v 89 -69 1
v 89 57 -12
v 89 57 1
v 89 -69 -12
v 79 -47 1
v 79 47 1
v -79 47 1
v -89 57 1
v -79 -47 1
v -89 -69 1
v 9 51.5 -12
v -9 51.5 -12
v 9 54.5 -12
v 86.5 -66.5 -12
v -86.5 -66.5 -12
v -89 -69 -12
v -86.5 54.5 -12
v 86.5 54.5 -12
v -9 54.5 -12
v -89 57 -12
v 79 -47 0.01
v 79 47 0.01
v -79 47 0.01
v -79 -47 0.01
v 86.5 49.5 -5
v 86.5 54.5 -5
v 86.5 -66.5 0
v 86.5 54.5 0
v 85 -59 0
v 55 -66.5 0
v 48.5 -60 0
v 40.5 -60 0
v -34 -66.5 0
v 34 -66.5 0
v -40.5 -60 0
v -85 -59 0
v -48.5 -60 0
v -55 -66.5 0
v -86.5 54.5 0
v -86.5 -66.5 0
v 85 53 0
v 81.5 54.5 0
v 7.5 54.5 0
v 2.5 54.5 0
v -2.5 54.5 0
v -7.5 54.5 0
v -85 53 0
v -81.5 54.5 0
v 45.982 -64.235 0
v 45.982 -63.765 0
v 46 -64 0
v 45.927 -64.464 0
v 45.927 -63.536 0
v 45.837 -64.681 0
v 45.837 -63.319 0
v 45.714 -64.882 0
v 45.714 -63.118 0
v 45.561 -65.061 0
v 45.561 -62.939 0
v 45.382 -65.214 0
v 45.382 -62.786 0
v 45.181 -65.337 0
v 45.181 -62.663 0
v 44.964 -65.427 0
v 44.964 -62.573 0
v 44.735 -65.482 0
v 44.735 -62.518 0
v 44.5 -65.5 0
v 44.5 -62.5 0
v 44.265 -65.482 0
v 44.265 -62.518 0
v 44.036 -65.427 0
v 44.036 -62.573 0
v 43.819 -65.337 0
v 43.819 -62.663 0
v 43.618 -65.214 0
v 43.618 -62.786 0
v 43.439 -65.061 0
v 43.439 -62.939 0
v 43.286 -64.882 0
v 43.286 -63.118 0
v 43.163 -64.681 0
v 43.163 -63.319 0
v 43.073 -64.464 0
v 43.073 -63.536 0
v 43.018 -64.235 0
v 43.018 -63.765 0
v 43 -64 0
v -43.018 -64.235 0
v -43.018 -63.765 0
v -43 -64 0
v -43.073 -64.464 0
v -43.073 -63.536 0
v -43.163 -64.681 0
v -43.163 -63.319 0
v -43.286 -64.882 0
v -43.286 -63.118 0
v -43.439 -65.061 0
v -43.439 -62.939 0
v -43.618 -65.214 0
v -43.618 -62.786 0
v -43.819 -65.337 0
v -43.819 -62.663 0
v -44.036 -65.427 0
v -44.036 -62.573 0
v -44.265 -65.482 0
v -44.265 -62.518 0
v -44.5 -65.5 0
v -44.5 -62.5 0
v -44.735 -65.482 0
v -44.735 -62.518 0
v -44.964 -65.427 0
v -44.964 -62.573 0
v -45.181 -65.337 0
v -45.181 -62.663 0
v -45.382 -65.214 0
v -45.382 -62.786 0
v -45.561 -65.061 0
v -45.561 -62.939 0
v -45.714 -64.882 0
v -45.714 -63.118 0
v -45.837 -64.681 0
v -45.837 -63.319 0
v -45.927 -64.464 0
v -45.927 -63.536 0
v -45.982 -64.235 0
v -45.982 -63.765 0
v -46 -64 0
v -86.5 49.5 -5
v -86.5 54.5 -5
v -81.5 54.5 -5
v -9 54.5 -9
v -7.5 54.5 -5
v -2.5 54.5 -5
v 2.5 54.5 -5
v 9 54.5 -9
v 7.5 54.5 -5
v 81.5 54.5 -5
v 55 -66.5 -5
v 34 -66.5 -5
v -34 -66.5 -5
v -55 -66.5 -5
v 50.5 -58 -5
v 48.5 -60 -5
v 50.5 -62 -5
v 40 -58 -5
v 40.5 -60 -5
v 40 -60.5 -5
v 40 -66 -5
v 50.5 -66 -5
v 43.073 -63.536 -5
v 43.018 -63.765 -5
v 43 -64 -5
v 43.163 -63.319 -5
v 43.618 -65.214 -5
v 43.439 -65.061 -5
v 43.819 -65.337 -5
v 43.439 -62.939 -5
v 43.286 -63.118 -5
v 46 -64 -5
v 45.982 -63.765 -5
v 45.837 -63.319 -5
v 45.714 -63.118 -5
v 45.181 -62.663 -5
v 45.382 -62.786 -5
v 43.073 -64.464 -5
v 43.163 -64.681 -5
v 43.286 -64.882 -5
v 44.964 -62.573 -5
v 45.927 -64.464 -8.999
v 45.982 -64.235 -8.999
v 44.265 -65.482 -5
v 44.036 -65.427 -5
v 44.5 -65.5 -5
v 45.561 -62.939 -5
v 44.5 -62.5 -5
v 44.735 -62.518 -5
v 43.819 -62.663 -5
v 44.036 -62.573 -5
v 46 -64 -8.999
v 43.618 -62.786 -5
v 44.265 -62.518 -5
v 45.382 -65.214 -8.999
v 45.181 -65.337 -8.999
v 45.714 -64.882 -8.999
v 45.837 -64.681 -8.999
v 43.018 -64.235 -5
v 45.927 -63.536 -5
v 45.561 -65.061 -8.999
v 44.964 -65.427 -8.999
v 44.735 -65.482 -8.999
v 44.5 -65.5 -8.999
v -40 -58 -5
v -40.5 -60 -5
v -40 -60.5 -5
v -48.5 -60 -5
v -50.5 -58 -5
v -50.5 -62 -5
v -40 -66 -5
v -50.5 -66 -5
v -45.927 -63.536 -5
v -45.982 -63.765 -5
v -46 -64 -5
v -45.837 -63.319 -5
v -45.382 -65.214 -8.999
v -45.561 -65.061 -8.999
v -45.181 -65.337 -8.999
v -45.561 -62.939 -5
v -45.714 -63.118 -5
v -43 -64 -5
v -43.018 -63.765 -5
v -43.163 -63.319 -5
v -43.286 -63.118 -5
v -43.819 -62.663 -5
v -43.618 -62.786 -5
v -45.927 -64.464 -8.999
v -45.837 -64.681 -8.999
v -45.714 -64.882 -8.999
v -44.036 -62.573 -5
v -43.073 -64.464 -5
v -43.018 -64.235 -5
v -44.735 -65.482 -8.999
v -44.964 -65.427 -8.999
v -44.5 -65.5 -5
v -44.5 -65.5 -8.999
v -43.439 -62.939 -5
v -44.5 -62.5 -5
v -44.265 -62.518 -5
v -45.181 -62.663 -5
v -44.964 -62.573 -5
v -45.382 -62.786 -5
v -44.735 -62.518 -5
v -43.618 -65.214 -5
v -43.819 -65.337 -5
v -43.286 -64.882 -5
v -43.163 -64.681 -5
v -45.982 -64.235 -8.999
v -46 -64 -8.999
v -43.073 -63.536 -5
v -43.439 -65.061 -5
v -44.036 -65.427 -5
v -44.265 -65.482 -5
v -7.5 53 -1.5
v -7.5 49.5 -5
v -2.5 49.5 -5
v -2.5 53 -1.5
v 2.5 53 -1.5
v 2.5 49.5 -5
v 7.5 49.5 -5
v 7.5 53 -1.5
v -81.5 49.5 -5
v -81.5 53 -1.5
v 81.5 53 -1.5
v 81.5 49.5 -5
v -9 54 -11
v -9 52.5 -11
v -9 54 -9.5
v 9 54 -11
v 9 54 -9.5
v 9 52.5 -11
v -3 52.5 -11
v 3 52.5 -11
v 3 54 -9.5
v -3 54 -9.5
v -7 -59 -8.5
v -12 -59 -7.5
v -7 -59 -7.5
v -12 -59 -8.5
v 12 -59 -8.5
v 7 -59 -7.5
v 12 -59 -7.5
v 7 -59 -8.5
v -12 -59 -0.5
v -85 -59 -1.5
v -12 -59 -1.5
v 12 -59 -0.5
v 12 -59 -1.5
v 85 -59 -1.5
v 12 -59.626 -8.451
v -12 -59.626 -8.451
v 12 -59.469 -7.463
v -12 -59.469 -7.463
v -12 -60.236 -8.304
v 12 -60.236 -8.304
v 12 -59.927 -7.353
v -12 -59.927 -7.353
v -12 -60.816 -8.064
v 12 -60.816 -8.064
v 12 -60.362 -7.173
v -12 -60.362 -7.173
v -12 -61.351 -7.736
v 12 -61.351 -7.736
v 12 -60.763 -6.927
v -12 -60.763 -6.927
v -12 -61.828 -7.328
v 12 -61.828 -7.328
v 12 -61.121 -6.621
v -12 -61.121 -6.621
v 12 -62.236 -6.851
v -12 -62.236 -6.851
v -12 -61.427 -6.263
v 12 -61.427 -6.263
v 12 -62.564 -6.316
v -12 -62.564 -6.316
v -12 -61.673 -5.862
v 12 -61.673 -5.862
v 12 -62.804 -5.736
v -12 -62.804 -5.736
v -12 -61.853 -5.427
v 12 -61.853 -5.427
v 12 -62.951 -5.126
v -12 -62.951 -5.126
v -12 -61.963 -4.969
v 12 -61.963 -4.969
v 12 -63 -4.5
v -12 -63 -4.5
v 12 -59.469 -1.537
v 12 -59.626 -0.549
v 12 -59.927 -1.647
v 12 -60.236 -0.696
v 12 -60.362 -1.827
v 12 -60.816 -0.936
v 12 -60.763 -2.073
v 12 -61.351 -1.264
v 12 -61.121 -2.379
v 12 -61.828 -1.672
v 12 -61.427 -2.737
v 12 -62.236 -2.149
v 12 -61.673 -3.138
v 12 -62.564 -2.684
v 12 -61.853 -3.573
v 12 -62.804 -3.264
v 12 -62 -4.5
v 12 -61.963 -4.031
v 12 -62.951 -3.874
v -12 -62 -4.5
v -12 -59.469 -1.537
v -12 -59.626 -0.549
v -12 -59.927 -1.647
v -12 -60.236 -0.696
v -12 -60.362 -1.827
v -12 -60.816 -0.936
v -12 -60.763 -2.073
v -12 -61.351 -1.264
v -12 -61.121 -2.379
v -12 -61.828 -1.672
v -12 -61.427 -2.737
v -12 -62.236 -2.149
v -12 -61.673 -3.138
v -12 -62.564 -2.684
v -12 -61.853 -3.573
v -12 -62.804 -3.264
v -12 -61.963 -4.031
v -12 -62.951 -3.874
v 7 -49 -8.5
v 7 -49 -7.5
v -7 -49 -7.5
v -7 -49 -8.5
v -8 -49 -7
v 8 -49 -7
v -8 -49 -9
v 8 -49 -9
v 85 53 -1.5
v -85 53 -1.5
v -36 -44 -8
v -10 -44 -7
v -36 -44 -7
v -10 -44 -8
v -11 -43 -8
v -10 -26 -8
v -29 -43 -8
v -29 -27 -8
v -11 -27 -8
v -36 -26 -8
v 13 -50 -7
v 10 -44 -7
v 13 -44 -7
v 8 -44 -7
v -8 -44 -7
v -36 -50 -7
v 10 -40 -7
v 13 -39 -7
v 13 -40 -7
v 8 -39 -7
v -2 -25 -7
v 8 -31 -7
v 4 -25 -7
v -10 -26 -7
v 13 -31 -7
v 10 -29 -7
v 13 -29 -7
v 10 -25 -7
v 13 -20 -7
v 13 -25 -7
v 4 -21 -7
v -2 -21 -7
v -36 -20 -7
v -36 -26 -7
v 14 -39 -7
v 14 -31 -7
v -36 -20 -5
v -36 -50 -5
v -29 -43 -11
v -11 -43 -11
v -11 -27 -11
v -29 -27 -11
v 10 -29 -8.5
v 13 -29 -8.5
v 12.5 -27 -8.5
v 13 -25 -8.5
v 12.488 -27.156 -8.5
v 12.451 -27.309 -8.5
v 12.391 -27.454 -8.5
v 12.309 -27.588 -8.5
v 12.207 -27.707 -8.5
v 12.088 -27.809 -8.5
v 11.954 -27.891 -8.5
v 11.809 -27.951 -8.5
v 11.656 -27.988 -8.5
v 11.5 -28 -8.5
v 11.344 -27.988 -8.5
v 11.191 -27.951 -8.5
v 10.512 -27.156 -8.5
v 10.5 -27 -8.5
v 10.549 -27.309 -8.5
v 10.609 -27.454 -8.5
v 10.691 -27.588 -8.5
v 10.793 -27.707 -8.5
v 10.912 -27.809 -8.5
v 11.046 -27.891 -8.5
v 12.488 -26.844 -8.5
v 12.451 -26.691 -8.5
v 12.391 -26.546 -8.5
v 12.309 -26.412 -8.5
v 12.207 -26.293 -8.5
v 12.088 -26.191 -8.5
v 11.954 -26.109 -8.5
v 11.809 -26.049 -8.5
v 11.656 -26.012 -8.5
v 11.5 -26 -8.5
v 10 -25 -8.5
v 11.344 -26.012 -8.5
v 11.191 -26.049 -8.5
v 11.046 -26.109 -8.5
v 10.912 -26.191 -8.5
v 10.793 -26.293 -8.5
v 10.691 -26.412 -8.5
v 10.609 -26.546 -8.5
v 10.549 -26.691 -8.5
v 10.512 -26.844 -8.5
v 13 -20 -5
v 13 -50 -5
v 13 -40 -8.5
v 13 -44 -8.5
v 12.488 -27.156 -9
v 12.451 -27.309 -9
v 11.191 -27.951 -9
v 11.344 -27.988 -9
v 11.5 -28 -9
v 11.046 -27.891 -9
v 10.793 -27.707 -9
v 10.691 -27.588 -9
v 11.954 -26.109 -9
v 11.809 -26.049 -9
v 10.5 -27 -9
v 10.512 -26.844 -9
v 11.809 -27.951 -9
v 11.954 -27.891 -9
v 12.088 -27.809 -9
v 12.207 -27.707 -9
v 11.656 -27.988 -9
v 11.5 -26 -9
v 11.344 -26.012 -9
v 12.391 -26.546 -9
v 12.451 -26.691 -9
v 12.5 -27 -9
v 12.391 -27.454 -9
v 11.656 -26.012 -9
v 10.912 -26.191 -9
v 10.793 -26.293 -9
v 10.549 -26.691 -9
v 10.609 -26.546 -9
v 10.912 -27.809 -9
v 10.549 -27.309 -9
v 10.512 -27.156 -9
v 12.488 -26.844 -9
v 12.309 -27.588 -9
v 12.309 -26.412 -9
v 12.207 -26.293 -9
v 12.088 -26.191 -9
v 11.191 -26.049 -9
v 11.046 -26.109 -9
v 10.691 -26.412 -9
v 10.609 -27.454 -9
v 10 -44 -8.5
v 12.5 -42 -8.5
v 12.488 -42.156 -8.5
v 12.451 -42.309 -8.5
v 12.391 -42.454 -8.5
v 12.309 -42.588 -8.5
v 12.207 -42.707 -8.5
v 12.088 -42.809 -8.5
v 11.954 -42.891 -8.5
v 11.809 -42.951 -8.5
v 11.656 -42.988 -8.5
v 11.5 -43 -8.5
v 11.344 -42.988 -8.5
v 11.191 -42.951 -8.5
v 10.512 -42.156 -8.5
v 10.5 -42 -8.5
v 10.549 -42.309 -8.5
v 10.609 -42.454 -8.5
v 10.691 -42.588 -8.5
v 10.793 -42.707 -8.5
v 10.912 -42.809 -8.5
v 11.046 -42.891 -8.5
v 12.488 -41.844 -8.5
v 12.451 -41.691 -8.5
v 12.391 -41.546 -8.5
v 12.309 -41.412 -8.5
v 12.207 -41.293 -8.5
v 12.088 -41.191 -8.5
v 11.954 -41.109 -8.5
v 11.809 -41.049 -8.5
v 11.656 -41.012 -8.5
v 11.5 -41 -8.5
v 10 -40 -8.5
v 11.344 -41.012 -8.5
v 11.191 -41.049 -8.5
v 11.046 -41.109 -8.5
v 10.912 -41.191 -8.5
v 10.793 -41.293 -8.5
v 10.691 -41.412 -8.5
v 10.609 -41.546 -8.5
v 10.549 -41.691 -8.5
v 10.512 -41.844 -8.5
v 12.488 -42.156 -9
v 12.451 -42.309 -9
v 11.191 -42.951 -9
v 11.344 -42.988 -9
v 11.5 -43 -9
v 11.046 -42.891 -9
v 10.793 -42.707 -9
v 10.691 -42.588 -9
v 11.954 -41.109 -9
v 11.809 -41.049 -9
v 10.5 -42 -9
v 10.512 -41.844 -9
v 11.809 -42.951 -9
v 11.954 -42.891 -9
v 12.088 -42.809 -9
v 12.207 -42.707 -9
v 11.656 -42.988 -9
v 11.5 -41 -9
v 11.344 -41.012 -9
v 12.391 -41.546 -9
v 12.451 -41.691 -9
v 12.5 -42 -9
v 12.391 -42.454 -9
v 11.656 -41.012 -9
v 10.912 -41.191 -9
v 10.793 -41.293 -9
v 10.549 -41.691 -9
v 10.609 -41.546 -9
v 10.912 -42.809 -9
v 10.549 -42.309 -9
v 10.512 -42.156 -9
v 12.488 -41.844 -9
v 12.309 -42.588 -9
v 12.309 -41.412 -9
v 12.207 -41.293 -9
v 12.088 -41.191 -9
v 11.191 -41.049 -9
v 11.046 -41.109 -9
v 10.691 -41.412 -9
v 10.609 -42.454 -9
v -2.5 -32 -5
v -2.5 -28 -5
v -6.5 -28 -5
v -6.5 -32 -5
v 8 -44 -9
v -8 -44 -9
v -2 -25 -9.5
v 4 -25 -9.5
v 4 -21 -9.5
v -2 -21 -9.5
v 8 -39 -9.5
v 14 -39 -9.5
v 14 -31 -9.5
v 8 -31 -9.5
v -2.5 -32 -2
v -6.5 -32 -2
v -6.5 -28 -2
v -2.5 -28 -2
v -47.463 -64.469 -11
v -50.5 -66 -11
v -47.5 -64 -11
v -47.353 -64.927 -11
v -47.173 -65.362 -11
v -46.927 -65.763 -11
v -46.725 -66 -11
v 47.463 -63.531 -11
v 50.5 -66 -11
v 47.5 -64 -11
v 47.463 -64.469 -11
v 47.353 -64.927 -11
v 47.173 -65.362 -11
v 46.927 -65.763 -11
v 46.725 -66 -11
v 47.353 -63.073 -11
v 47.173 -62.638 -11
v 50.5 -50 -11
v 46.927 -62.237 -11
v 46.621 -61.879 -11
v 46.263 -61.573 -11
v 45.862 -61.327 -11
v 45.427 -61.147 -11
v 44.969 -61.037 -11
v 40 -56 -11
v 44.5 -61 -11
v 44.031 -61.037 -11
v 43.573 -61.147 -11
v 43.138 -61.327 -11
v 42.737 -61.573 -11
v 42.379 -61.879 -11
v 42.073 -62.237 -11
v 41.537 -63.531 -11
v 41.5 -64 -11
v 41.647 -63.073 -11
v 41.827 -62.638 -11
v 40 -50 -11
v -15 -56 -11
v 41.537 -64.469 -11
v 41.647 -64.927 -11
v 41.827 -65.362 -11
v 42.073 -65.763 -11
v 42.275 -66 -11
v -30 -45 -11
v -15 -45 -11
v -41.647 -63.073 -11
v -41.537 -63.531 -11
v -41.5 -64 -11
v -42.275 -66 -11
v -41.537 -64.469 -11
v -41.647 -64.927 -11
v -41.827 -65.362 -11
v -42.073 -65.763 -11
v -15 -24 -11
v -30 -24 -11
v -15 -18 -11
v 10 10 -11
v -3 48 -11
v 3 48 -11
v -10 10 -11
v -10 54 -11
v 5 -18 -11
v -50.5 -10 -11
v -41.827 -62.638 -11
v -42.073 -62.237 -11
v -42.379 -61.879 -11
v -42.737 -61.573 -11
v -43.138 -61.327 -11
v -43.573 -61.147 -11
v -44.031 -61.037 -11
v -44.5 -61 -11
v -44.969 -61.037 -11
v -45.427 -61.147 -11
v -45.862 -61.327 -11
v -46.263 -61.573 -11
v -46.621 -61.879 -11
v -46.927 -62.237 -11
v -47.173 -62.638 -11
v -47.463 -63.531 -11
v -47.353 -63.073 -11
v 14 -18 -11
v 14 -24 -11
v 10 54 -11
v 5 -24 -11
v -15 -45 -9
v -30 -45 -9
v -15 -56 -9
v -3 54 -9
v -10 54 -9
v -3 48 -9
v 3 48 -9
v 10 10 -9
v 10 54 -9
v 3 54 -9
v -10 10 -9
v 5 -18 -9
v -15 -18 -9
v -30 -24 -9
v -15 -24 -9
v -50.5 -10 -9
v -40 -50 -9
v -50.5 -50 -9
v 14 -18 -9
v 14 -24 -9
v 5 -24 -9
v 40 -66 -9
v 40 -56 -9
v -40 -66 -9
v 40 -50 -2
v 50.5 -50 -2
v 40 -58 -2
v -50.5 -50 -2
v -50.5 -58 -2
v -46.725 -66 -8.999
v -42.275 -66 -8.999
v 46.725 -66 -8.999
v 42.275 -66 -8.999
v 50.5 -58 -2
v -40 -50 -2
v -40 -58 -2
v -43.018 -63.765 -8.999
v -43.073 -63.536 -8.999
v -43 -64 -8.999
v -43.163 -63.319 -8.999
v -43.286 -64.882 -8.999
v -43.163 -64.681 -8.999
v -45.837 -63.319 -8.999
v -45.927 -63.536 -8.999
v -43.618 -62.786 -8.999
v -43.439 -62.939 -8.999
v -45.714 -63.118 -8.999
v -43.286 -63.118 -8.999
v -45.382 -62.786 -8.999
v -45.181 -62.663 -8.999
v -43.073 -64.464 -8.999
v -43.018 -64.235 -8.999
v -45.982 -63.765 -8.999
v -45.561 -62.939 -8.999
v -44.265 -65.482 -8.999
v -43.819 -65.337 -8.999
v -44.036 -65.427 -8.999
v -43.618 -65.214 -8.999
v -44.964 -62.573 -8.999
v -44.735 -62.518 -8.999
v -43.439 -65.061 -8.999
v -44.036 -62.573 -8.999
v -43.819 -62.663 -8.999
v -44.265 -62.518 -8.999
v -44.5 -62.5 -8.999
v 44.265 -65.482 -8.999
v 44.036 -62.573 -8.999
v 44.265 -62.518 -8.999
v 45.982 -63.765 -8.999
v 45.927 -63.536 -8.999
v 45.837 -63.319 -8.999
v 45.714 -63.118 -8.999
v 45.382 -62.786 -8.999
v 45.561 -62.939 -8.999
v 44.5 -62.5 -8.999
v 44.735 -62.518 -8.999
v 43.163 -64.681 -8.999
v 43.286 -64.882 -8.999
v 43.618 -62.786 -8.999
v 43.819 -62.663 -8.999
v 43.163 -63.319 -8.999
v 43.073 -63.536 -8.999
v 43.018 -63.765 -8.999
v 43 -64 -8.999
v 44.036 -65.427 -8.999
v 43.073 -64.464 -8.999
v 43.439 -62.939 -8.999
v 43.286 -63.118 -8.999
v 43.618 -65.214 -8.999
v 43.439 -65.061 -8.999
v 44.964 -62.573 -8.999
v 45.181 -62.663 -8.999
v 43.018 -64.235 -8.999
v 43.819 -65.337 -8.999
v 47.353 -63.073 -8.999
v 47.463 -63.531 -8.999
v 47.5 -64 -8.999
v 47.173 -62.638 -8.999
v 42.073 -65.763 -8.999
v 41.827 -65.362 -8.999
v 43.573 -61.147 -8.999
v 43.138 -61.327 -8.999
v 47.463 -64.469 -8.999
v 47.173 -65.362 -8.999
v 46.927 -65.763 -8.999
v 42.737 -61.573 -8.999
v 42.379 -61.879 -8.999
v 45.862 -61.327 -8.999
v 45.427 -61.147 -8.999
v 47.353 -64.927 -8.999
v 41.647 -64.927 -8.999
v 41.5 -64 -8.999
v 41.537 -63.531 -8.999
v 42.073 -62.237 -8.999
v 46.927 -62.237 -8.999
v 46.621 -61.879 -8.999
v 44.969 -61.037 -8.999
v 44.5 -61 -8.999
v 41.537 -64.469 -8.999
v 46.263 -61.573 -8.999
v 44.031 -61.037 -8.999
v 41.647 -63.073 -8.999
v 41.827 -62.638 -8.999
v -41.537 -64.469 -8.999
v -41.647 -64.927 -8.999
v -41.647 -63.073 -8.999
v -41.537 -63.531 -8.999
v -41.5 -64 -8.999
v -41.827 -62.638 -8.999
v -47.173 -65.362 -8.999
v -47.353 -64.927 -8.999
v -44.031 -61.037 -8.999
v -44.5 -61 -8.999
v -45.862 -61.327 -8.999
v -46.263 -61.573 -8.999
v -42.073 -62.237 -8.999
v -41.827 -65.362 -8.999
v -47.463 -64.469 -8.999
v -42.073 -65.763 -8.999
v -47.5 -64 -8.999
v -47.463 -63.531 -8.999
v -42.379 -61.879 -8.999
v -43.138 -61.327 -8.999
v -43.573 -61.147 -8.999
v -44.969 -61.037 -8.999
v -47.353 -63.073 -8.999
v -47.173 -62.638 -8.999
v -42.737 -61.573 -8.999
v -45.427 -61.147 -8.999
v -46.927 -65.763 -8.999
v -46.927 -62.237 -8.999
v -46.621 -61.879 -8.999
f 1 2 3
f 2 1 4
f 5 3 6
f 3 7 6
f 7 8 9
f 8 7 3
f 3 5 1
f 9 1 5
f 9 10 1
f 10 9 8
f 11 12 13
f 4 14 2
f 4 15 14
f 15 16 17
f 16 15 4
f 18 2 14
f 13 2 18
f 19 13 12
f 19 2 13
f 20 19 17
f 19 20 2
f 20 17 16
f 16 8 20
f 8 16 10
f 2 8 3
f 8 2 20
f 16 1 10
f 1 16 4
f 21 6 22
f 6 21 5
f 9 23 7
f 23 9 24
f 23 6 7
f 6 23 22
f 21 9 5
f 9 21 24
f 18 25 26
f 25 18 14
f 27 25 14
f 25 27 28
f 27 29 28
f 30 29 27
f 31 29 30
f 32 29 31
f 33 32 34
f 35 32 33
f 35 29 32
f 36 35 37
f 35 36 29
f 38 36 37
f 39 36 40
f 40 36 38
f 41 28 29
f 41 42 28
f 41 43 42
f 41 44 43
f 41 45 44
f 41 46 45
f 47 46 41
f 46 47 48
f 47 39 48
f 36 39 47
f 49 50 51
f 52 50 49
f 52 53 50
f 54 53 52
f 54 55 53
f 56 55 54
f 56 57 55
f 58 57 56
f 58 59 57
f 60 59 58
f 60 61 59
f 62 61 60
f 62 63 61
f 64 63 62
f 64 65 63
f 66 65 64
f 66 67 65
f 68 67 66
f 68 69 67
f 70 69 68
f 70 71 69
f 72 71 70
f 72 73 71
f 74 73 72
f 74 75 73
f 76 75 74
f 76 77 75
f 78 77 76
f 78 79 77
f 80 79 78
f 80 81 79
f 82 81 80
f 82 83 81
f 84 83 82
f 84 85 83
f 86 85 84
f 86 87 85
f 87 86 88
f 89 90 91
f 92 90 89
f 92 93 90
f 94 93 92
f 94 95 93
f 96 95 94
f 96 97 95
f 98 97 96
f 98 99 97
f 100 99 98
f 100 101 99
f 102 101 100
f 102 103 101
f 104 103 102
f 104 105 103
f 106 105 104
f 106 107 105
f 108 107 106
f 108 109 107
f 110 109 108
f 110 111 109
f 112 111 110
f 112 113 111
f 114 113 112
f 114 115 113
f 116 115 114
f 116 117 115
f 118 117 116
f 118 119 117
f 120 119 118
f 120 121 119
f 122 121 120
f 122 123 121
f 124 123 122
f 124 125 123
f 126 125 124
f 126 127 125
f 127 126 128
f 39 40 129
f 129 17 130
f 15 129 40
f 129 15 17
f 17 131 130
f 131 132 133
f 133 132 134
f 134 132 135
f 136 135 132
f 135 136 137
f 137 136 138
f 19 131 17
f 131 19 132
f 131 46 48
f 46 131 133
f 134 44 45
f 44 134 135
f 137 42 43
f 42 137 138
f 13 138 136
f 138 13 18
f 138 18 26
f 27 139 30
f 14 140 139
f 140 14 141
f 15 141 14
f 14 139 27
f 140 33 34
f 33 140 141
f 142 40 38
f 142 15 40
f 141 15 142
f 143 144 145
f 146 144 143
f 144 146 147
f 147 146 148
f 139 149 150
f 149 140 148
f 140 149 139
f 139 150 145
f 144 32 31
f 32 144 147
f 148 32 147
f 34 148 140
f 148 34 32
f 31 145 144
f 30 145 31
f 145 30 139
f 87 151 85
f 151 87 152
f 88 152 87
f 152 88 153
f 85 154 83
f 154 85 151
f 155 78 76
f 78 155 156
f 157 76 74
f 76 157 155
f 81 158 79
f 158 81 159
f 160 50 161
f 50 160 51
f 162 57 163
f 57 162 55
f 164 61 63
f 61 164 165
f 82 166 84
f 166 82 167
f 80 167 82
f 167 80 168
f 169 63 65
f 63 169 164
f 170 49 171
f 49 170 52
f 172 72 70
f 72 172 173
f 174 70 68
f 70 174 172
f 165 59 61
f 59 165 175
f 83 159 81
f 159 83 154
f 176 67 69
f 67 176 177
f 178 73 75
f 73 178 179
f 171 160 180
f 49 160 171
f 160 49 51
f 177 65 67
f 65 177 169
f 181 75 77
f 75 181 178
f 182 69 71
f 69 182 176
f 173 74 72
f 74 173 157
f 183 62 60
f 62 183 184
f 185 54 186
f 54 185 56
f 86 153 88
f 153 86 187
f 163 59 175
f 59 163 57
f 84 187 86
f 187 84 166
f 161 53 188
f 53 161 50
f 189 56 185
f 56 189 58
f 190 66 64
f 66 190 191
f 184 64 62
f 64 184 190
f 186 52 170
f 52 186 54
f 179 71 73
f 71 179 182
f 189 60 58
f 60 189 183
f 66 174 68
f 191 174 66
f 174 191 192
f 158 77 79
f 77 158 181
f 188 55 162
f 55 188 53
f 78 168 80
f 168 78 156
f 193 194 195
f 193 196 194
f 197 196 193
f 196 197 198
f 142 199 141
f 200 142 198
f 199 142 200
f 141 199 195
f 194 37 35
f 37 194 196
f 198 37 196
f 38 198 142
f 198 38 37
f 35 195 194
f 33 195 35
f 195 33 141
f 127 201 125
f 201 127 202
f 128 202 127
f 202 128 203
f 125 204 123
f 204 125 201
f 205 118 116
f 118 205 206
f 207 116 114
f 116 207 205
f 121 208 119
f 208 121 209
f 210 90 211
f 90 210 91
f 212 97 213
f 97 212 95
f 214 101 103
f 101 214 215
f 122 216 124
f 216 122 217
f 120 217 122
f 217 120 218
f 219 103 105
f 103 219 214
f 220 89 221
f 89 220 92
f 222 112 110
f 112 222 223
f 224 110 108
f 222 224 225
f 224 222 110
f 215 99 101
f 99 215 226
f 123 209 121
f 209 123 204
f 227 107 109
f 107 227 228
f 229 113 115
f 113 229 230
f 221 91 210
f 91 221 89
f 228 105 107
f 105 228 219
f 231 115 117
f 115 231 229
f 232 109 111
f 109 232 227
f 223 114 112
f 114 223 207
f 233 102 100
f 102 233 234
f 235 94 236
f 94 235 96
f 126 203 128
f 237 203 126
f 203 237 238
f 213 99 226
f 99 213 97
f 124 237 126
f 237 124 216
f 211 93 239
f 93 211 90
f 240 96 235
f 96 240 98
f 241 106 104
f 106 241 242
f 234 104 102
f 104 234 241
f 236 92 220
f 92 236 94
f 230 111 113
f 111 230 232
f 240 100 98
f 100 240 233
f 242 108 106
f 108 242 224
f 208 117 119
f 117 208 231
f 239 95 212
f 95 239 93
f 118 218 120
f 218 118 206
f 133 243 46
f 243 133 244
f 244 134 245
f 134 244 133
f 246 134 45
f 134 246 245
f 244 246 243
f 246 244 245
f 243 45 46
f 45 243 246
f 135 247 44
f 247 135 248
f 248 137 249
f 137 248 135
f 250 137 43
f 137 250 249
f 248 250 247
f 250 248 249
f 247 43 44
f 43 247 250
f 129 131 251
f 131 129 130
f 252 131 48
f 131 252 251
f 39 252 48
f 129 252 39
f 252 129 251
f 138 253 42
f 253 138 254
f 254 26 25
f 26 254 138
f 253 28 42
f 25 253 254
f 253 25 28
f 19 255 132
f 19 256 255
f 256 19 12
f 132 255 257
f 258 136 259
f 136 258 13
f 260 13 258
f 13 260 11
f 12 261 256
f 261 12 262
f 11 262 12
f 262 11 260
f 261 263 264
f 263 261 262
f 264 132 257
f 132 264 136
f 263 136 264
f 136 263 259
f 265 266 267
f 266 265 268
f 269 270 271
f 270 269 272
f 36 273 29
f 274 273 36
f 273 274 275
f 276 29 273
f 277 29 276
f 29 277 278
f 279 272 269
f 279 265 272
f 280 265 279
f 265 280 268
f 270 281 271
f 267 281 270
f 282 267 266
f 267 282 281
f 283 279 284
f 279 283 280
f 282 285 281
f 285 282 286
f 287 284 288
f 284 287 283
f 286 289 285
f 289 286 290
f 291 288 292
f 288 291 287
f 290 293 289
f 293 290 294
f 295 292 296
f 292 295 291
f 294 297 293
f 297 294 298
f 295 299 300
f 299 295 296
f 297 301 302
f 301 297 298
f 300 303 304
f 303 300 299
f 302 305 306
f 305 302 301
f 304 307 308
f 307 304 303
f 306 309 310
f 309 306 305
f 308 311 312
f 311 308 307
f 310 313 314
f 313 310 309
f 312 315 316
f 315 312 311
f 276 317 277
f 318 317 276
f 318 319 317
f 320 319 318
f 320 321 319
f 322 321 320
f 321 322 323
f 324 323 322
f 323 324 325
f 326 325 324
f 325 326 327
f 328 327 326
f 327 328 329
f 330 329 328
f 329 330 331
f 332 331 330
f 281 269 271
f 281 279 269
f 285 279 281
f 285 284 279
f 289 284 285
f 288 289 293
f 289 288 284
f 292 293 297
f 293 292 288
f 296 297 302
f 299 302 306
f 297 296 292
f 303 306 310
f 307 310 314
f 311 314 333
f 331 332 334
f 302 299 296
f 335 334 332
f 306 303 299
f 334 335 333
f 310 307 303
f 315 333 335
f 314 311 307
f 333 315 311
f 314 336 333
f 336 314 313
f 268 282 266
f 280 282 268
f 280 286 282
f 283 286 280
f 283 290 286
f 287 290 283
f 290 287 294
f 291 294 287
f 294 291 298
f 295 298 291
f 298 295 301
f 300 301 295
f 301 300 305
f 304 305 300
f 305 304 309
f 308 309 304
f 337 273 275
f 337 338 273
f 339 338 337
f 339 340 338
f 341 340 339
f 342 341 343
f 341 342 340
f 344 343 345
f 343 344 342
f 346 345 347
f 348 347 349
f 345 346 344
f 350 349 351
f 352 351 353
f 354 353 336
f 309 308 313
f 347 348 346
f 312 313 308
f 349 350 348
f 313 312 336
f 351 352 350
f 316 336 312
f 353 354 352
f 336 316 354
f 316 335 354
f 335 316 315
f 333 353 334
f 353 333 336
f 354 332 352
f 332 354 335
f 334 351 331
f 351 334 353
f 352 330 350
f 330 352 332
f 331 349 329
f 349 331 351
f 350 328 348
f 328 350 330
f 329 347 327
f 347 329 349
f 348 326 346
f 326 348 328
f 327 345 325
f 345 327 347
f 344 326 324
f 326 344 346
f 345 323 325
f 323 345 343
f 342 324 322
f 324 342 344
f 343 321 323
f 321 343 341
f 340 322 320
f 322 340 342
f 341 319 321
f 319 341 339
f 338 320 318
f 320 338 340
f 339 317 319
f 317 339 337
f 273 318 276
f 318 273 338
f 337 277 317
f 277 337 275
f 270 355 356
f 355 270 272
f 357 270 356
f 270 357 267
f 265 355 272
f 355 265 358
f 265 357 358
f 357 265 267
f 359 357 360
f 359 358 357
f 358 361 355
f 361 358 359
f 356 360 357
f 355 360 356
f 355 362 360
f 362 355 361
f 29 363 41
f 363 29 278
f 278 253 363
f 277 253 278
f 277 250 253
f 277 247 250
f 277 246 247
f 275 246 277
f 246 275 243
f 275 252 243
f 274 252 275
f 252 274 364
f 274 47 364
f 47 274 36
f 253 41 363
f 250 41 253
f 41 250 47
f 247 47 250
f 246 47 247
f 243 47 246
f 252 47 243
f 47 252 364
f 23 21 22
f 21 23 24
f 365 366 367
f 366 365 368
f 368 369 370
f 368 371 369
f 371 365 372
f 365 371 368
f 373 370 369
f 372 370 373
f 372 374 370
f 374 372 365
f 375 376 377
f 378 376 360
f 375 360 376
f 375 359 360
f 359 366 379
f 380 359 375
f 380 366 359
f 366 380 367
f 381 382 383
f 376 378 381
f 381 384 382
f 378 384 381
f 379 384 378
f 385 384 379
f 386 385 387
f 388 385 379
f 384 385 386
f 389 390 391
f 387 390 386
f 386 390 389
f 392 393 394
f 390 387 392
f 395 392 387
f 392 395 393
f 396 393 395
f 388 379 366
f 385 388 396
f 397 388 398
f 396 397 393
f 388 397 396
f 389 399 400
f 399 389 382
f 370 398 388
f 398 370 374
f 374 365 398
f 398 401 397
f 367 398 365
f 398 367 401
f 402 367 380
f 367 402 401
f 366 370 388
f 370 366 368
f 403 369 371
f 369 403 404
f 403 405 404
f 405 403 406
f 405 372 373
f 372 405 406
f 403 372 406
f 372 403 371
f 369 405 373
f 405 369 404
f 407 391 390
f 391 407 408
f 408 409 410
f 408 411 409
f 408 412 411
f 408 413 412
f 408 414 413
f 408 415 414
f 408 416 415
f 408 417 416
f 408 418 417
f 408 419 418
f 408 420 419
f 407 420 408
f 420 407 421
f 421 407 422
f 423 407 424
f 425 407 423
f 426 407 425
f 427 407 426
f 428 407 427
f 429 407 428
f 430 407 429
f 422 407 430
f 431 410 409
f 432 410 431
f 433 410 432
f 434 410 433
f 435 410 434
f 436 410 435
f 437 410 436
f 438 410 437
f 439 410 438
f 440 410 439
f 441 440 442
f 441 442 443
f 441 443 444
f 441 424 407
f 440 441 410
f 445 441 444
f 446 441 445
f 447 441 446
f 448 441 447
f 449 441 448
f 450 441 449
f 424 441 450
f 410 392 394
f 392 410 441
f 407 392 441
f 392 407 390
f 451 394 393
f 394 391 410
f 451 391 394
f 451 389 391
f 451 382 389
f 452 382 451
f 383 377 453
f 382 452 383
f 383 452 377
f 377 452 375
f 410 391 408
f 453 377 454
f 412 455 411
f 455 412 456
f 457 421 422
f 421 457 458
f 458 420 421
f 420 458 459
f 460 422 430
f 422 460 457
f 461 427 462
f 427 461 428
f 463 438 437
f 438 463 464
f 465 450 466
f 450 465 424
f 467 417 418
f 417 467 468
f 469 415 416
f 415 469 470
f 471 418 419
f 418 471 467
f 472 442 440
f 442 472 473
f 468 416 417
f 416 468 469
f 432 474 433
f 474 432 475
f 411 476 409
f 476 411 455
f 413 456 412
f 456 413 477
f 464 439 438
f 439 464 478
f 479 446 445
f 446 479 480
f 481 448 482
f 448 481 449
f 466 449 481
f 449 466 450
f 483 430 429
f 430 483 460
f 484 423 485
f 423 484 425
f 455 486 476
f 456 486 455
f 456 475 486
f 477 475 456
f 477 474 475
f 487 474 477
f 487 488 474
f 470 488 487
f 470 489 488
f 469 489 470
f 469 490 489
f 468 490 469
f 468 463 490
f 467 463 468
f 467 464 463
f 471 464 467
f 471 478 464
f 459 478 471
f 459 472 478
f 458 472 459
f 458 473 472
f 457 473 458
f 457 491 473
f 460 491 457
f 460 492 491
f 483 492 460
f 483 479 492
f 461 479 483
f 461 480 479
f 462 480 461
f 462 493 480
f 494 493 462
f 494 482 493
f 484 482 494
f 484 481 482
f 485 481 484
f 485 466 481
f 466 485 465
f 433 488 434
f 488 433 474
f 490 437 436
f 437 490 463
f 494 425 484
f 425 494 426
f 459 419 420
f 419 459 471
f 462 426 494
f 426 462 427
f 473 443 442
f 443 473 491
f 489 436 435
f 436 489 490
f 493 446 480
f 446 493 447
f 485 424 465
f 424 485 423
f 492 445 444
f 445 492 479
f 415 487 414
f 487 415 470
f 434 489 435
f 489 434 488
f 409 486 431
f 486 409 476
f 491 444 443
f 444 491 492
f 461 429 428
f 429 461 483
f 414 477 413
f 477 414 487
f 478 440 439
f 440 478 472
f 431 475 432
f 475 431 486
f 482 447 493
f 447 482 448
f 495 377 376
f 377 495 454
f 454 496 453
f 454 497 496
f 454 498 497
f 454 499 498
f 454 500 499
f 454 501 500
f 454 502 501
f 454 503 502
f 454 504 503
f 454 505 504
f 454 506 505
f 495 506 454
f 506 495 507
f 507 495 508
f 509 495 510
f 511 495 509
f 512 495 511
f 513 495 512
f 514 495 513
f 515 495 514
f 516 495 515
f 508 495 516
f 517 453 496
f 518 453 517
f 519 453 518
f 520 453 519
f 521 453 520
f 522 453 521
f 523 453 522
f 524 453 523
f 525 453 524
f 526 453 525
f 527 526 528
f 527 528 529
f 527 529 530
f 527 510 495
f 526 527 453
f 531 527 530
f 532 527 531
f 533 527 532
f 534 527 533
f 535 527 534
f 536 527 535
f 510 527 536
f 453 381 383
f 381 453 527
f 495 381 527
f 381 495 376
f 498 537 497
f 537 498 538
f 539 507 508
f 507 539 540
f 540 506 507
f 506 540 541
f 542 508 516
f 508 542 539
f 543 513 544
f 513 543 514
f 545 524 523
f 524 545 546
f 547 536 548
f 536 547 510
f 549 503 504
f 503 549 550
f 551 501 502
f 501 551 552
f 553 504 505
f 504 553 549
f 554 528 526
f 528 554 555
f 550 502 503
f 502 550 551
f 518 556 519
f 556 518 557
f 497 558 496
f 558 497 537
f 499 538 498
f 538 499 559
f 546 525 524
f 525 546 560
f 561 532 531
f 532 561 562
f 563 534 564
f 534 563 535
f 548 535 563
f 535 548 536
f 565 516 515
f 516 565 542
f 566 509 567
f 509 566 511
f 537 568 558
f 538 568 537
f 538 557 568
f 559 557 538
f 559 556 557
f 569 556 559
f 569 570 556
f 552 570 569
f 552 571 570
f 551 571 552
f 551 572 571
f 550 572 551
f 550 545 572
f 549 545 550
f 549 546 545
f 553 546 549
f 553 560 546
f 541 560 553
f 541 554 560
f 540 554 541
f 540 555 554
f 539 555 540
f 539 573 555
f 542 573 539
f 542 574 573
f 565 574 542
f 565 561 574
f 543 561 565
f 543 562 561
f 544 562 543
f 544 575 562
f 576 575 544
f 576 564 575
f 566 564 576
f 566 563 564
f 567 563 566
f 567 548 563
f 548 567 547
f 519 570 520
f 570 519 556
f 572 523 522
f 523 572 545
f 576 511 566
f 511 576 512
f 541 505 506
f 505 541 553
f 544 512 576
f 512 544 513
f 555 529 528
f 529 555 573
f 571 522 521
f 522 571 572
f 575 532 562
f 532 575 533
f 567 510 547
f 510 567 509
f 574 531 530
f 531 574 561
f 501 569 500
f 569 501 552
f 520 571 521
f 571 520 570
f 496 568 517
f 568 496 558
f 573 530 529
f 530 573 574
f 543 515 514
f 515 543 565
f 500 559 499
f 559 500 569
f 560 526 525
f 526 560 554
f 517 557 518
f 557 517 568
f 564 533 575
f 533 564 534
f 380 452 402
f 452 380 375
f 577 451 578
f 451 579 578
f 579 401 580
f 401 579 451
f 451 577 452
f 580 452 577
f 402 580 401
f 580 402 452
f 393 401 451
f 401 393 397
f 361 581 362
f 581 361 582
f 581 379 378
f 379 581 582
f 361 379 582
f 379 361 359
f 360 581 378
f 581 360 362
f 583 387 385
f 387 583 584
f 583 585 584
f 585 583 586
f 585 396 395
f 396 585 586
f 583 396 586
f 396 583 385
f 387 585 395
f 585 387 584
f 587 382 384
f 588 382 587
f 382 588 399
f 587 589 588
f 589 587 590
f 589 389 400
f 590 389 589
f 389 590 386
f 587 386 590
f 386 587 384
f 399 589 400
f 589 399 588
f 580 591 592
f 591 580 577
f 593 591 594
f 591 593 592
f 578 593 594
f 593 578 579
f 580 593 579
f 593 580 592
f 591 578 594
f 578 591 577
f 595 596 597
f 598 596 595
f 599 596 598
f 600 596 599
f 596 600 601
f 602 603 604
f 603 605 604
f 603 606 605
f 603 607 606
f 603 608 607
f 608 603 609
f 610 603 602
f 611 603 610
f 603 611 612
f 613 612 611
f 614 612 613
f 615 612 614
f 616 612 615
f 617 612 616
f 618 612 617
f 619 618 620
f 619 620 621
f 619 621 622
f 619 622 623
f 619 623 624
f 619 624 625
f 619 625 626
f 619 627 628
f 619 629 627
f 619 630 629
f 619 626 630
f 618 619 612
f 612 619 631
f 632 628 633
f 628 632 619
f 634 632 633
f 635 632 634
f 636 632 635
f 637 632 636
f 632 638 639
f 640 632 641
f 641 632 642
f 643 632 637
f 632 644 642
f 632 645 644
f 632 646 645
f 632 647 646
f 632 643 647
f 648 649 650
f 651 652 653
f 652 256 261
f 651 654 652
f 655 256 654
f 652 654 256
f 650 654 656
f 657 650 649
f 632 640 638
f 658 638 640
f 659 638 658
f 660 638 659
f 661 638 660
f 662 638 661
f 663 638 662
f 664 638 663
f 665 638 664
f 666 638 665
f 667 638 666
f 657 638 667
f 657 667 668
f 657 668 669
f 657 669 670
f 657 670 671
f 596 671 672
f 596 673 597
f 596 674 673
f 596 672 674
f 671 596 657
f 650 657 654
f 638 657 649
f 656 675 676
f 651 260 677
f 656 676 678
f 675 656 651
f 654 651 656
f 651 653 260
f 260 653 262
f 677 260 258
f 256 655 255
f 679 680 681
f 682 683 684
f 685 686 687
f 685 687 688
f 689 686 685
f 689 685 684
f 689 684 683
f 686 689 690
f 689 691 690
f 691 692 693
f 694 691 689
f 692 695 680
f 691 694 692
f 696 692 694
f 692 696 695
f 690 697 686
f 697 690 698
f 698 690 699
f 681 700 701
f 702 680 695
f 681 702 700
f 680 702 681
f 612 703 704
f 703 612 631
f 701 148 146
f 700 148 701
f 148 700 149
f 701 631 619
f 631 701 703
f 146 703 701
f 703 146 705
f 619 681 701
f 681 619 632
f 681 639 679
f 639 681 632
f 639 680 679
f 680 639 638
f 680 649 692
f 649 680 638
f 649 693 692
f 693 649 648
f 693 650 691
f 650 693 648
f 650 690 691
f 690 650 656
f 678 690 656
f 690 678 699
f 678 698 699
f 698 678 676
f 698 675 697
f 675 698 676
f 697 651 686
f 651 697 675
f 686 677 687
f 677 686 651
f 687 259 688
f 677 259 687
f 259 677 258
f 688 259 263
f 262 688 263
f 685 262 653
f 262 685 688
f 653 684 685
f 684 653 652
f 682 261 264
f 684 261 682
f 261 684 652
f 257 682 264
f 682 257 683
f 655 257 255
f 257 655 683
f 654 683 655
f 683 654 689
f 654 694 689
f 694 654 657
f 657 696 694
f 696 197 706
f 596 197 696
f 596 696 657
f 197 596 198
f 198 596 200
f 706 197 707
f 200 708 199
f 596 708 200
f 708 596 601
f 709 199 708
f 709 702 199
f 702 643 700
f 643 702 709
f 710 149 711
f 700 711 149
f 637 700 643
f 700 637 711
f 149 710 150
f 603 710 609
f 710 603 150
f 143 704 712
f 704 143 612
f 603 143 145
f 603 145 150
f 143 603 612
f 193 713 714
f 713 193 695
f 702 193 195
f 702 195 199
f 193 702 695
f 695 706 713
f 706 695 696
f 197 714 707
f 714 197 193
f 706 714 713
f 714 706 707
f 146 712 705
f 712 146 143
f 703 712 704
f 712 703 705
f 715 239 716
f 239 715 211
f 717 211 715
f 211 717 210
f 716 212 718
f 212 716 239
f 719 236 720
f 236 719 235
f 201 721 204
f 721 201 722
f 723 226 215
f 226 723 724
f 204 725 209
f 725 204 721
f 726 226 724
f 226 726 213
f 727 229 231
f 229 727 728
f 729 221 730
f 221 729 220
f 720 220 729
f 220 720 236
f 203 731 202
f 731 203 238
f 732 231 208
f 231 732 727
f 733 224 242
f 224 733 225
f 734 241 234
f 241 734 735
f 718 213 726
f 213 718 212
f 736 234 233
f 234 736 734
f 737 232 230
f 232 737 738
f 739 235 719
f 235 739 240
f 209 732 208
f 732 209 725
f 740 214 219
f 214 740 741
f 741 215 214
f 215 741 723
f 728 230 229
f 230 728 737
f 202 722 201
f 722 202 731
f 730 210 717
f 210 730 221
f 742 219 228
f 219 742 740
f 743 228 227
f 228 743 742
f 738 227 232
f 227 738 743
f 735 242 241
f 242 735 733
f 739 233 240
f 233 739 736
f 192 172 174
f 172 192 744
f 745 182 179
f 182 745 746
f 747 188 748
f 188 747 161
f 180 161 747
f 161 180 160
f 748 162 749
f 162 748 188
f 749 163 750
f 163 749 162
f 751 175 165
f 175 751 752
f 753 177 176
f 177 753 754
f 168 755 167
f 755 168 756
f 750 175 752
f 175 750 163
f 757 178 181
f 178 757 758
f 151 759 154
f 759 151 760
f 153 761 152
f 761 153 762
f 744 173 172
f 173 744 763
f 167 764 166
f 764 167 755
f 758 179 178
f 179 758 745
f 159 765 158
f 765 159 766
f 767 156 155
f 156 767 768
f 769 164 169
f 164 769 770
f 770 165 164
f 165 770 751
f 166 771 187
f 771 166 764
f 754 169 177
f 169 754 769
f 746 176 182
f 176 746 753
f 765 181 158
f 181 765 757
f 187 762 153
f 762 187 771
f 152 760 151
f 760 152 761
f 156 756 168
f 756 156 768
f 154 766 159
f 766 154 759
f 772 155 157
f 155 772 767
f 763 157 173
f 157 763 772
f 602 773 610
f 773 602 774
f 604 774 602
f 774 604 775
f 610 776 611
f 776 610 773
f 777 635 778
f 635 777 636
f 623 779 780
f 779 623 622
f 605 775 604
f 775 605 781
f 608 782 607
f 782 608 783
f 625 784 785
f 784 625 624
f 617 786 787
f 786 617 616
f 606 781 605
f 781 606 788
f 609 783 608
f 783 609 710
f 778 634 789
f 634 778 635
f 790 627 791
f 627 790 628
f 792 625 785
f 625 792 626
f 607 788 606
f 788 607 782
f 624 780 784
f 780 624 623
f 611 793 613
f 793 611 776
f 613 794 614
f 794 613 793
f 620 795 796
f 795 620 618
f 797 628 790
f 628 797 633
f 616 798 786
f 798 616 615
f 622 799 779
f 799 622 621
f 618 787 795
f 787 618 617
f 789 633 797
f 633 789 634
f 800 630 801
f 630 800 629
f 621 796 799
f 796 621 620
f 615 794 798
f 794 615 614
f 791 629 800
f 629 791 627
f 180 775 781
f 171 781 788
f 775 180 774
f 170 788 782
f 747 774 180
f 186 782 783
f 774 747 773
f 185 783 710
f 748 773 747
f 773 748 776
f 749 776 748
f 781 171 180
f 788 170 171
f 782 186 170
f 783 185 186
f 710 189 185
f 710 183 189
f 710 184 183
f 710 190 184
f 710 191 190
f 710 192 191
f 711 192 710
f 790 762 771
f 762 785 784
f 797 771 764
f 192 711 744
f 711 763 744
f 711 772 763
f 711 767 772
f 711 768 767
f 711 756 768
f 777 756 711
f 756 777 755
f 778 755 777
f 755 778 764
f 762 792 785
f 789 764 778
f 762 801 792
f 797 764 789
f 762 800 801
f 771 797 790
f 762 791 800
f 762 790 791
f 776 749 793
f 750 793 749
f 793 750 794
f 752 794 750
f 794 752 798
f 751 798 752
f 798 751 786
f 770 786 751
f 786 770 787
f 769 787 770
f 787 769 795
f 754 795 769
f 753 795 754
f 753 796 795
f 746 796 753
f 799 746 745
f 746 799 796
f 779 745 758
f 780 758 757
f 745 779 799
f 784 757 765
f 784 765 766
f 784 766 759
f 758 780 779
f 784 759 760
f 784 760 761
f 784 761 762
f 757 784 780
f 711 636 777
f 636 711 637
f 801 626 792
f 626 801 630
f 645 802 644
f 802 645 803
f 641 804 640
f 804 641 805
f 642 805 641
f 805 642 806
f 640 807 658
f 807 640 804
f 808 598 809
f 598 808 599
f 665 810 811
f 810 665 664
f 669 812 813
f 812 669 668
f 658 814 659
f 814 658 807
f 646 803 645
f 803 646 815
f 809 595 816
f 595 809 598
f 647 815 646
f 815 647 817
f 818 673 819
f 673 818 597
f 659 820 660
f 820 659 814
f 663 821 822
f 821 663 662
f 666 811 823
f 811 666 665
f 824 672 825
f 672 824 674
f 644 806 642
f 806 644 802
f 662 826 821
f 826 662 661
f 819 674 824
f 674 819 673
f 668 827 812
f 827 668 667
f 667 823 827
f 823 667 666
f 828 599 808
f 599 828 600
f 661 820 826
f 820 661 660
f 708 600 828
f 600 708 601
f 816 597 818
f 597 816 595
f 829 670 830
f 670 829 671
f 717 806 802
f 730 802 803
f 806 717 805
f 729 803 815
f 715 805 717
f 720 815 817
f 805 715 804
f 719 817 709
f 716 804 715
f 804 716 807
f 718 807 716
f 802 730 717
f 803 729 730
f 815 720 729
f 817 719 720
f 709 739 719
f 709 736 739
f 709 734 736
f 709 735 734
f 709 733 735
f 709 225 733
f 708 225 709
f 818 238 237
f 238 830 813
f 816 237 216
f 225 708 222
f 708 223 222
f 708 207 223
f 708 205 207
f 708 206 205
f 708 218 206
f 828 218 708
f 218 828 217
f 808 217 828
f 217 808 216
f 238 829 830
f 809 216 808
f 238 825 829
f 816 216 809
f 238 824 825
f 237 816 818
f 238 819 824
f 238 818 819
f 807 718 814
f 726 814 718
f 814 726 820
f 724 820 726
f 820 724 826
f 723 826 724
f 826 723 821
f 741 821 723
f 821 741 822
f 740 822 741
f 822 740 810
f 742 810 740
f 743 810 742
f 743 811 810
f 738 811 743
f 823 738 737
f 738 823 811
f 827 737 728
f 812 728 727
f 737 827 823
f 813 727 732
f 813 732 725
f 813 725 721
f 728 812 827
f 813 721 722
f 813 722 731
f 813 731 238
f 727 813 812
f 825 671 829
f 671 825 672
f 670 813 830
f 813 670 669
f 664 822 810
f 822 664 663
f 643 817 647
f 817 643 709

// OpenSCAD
frontside();

$fn = 40;

translate([ 0, -3, -1.5 ]) waveshare_7in5(false);

translate([ 13, -20, -5 ]) rotate([ 0, 180, 90 ]) waveshare_esp32_driver(false);

translate([ 0, 0, 1 ]) backplate();

module backplate() {
  difference() {
    union() {
      {
        translate([ 0, 0, -12 ]) linear_extrude(2) polygon([
          [ 10, 10 ],     [ 10, 54 ], // top left
          [ 3, 54 ],      [ 3, 48 ],      [ -3, 48 ],   [ -3, 54 ],
          [ -10, 54 ],    [ -10, 10 ], //  end of zunge
          [ -50.5, -10 ], [ -50.5, -66 ], [ -15, -66 ], [ 50.5, -66 ],
          [ 50.5, -50 ],  [ 40, -50 ],    [ 40, -56 ],  [ -15, -56 ],
          [ -15, -45 ],   [ -30, -45 ],   [ -30, -24 ], [ -15, -24 ],
          [ -15, -18 ],   [ 5, -18 ],     [ 5, -24 ],   [ 14, -24 ],
          [ 14, -18 ],
        ]);
        translate([ 0, 0, -10 ]) linear_extrude(4) polygon([
          [ -50.5, -50 ],
          [ -50.5, -66 ],
          [ -40, -66 ],
          [ -40, -50 ],
        ]);
        translate([ 0, 0, -10 ]) linear_extrude(4) polygon([
          [ 50.5, -50 ],
          [ 50.5, -66 ],
          [ 40, -66 ],
          [ 40, -50 ],
        ]);
        translate([ 0, 0, -6 ]) linear_extrude(3) polygon([
          [ -50.5, -50 ],
          [ -50.5, -58 ],
          [ -40, -58 ],
          [ -40, -50 ],
        ]);
        translate([ 0, 0, -6 ]) linear_extrude(3) polygon([
          [ 50.5, -50 ],
          [ 50.5, -58 ],
          [ 40, -58 ],
          [ 40, -50 ],
        ]);
      }
    }
    translate([ -44.5, -64, 0 ]) cylinder(h = 40, r = 1.5, center = true);
    translate([ 44.5, -64, 0 ]) cylinder(h = 40, r = 1.5, center = true);
    translate([ 44.5, -64, -11 ]) cylinder(h = 2.001, r = 3, center = true);
    translate([ -44.5, -64, -11 ]) cylinder(h = 2.001, r = 3, center = true);
  }
}

module frontside(top_bezel = 10, bottom_bezel = 22, side_bezels = 10,
                 wall_thickness = 2.5, depth = 13, front_thickness = 1) {

  viewport_width = 158;
  viewport_height = 94;

  width = viewport_width + side_bezels * 2;
  height = viewport_height + top_bezel + bottom_bezel;
  y_offset = (top_bezel - bottom_bezel) / 2;

  difference() {
    translate([ 0, y_offset, front_thickness - depth / 2 ])
        cube([ width, height, depth ], center = true);            // outline
    cube([ viewport_width, viewport_height, 30 ], center = true); // view area
    translate([ 0, y_offset, -depth / 2 ])
        cube([ width - wall_thickness * 2, height - wall_thickness * 2, depth ],
             center = true); // hole
  };

  // Wedges to hold the display
  translate([ -5, height / 2 + y_offset - wall_thickness, 0 ]) edge(5);
  translate([ 5, height / 2 + y_offset - wall_thickness, 0 ]) edge(5);
  translate([
    -width / 2 + wall_thickness + 2.5, height / 2 + y_offset - wall_thickness, 0
  ]) edge(5);
  translate([
    width / 2 - wall_thickness - 2.5, height / 2 + y_offset - wall_thickness, 0
  ]) edge(5);

  translate([ width / 4, -height / 2 + y_offset + wall_thickness + 2.5, 0 ])
      rotate([ 0, 180, 0 ]) bohrloch(5);
  translate([ -width / 4, -height / 2 + y_offset + wall_thickness + 2.5, 0 ])
      rotate([ 0, 180, 0 ]) bohrloch(5);

  // wedge for total hold
  translate([ 0, height / 2 + y_offset - wall_thickness, -depth + 4 ])
      edge(3, 18);
}

module bohrloch(height, hole = 1.5) {
  depth = 8;
  translate([ 0, 0, height / 2 ]) difference() {
    union() {
      cube([ 8, depth, height ], center = true);
      translate([ 4, depth / 2, 0 ]) rotate([ 0, 90, 90 ])
          edge(width = height, size = depth);
      translate([ -4 - depth, -depth / 2, 0 ]) rotate([ 0, 90, 180 ])
          edge(width = height, size = depth);
    }
    cylinder(h = height + 1, r = hole, center = true);
  }
}

module edge(size = 10, width = 5) {
  translate([ -width / 2, -size, -size ]) rotate([ 90, 0, 90 ])
      linear_extrude(width)
          polygon(points = [ [ 0, 0 ], [ size, 0 ], [ size, size ] ]);
}

module waveshare_7in5(straight = true) {
  color("grey") translate([ -85, -56, 0 ]) cube([ 170, 112, 1.5 ]);
  color("white") translate([ -79, -44, 0.01 ]) cube([ 158, 94, 1.5 ]);

  if (straight) {
    color("gold") translate([ -12, -70, 0 ]) cube([ 24, 14, 1 ]);
    color("gold") translate([ -7, -80, 0 ]) cube([ 14, 10, 1 ]);
  } else {
    color("gold") translate([ 12, -56, -3 ]) rotate([ 0, 90, 180 ])
        rotate_extrude(angle = 180) translate([ 3, 0, 0 ]) square([ 1, 24 ]);
    color("gold") translate([ -7, -56, -7 ]) cube([ 14, 10, 1 ]);
  }
}

module waveshare_esp32_driver(with_pinheader = true) {
  // board
  color("blue") cube([ 30, 49, 2 ]);
  // top side
  translate([ 6, 23, 2 ]) esp32();
  color("white") translate([ 24, 5, 2 ]) cube([ 5, 16, 2 ]);
  color("black") translate([ 1, 9, 2 ]) cube([ 4, 6, 2.5 ]);
  color("silver") translate([ 11, -1, 2 ]) cube([ 8, 6, 2.5 ]);
  translate([ 5, 0, 2 ]) button();
  translate([ 20, 0, 2 ]) button();
  // bottom side
  color("black") translate([ 8, 15.5, -3 ]) cube([ 4, 4, 3 ]);
  if (with_pinheader) {
    translate([ 3.5, 0, 0 ]) rotate([ 0, 180, 0 ]) smd_pinheader();
    translate([ 26, 0, 0 ]) rotate([ 0, 180, 0 ]) smd_pinheader();
  }
}

module smd_pinheader() {
  for (i = [0:18]) {
    translate([ 0, 1.27 + i * 2.54, 0 ]) rotate([ 0, 0, i * 180 ]) smd_pin();
  }
}

module smd_pin() {
  color("yellow") translate([ 0, 0, 2 ]) cube(2.54, center = true);
  color("gold") translate([ 0, 0, 5 ]) cube([ 0.7, 0.7, 10 ], center = true);
  color("gold") translate([ 1.5, 0, 0.35 ])
      cube([ 3, 0.7, 0.7 ], center = true);
}

module button() {
  color("silver") cube([ 4, 3, 1.5 ]);
  color("black") translate([ 2, 1.5, 1.5 ]) cylinder(1, 1, center = true);
}

module esp32() {
  color("black") cube([ 18, 26, 1 ]);
  color("silver") translate([ 1, 1, 1 ]) cube([ 16, 18, 3 ]);
}
